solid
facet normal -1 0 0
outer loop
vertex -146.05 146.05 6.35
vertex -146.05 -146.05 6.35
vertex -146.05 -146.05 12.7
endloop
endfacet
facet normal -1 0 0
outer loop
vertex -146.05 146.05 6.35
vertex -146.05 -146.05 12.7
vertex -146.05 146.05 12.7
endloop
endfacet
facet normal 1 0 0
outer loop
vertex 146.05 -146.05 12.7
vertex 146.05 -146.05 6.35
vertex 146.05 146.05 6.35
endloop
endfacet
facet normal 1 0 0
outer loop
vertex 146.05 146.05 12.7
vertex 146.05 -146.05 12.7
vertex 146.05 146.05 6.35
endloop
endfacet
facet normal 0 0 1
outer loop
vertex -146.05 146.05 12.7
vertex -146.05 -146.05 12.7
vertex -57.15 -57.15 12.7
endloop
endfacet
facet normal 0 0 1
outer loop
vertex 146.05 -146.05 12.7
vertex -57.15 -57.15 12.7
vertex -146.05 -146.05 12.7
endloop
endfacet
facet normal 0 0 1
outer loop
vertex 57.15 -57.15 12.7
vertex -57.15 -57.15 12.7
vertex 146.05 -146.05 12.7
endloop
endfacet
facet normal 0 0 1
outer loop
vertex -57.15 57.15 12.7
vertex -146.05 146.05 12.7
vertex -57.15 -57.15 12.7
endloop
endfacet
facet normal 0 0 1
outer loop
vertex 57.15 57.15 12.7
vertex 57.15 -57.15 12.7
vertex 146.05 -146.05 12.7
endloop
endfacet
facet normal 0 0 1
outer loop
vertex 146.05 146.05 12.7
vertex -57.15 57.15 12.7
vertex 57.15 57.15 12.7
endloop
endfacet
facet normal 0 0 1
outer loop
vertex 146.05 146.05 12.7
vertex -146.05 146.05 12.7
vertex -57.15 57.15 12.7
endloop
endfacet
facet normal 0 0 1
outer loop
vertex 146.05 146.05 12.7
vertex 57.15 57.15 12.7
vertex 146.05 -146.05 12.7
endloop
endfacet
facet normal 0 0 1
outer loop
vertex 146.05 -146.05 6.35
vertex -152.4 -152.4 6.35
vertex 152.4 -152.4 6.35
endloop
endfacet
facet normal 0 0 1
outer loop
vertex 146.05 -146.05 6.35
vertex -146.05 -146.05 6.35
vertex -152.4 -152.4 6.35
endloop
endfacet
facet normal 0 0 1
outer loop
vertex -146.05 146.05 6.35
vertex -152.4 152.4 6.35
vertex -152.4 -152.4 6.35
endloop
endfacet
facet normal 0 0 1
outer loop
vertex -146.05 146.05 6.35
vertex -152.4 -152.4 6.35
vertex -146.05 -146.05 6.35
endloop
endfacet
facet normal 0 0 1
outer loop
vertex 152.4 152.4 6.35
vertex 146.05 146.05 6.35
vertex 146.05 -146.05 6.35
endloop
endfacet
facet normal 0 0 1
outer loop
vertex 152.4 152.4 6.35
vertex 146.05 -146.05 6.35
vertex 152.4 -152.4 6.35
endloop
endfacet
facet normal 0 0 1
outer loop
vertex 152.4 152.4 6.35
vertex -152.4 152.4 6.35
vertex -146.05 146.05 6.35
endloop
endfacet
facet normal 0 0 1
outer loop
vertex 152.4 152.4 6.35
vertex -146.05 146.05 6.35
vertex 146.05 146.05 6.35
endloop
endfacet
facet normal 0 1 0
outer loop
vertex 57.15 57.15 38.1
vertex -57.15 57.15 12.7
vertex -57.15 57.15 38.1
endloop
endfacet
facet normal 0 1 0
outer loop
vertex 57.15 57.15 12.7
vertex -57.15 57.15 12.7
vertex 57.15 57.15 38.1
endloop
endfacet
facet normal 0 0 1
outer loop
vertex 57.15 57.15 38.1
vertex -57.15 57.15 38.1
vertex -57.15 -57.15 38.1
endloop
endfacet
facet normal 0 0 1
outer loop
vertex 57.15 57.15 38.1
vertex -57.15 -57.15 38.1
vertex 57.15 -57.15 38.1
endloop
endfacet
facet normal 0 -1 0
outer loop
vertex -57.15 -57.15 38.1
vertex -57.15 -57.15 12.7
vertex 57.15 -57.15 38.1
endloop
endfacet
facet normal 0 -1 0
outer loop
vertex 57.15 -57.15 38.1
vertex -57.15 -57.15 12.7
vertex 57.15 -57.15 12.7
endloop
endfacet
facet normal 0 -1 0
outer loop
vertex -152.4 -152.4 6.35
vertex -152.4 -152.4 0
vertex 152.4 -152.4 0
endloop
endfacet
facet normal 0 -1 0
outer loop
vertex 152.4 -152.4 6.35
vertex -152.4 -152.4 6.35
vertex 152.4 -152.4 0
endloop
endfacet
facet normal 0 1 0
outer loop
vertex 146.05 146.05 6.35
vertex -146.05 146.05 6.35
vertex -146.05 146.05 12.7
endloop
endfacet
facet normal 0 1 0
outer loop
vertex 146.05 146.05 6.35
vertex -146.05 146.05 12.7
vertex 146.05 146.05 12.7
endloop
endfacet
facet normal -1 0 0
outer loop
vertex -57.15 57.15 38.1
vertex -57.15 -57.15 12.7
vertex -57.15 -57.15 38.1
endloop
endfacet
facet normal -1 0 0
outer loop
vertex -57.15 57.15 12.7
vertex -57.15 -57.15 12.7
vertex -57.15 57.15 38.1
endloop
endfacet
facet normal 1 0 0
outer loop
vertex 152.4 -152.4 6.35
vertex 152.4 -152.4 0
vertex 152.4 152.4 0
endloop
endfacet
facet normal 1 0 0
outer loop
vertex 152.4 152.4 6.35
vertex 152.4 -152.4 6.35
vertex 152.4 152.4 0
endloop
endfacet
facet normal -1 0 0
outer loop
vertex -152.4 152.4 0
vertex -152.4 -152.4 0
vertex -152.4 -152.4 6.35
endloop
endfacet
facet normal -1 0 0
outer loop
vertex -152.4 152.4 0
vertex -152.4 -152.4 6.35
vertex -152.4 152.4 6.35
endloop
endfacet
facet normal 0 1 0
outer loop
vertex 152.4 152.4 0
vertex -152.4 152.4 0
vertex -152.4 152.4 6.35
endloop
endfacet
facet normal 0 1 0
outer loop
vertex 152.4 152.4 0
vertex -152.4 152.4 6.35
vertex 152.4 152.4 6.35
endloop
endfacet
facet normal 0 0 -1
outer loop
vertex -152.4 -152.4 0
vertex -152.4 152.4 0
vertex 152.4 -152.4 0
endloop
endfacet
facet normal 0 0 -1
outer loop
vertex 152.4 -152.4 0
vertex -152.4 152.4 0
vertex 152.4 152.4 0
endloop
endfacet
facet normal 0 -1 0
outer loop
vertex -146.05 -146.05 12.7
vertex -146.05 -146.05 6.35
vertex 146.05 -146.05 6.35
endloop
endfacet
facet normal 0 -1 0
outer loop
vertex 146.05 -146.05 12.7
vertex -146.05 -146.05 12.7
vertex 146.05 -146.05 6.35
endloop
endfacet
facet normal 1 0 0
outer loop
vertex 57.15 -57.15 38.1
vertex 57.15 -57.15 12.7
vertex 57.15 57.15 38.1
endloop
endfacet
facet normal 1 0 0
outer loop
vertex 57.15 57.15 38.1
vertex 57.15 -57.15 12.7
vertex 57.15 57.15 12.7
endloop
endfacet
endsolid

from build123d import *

# Parameters (mm, degrees)
F0_W     = 304.8
F0_H     = 304.8
F0_W_2   = 292.1
F0_H_2   = 292.1
F1_DEPTH = 6.35
F2_DEPTH = 12.7
F3_W     = 114.3
F3_H     = 114.3
F4_DEPTH = 25.4


with BuildPart() as f1:
    # F0 (on Top) → F1 (new body)
    with BuildSketch(Plane.XY):
        Rectangle(F0_W, F0_H)
        Rectangle(F0_W_2, F0_H_2, mode=Mode.SUBTRACT)
    extrude(amount=F1_DEPTH)

    # F0 (on Top) → F2 (join)
    with BuildSketch(Plane.XY):
        Rectangle(F0_W_2, F0_H_2)
    extrude(amount=F2_DEPTH)

    # F3 (on face) → F4 (join)
    with BuildSketch(Plane.XY.offset(12.7)):
        Rectangle(F3_W, F3_H)
    extrude(amount=F4_DEPTH)


solid = f1.part
